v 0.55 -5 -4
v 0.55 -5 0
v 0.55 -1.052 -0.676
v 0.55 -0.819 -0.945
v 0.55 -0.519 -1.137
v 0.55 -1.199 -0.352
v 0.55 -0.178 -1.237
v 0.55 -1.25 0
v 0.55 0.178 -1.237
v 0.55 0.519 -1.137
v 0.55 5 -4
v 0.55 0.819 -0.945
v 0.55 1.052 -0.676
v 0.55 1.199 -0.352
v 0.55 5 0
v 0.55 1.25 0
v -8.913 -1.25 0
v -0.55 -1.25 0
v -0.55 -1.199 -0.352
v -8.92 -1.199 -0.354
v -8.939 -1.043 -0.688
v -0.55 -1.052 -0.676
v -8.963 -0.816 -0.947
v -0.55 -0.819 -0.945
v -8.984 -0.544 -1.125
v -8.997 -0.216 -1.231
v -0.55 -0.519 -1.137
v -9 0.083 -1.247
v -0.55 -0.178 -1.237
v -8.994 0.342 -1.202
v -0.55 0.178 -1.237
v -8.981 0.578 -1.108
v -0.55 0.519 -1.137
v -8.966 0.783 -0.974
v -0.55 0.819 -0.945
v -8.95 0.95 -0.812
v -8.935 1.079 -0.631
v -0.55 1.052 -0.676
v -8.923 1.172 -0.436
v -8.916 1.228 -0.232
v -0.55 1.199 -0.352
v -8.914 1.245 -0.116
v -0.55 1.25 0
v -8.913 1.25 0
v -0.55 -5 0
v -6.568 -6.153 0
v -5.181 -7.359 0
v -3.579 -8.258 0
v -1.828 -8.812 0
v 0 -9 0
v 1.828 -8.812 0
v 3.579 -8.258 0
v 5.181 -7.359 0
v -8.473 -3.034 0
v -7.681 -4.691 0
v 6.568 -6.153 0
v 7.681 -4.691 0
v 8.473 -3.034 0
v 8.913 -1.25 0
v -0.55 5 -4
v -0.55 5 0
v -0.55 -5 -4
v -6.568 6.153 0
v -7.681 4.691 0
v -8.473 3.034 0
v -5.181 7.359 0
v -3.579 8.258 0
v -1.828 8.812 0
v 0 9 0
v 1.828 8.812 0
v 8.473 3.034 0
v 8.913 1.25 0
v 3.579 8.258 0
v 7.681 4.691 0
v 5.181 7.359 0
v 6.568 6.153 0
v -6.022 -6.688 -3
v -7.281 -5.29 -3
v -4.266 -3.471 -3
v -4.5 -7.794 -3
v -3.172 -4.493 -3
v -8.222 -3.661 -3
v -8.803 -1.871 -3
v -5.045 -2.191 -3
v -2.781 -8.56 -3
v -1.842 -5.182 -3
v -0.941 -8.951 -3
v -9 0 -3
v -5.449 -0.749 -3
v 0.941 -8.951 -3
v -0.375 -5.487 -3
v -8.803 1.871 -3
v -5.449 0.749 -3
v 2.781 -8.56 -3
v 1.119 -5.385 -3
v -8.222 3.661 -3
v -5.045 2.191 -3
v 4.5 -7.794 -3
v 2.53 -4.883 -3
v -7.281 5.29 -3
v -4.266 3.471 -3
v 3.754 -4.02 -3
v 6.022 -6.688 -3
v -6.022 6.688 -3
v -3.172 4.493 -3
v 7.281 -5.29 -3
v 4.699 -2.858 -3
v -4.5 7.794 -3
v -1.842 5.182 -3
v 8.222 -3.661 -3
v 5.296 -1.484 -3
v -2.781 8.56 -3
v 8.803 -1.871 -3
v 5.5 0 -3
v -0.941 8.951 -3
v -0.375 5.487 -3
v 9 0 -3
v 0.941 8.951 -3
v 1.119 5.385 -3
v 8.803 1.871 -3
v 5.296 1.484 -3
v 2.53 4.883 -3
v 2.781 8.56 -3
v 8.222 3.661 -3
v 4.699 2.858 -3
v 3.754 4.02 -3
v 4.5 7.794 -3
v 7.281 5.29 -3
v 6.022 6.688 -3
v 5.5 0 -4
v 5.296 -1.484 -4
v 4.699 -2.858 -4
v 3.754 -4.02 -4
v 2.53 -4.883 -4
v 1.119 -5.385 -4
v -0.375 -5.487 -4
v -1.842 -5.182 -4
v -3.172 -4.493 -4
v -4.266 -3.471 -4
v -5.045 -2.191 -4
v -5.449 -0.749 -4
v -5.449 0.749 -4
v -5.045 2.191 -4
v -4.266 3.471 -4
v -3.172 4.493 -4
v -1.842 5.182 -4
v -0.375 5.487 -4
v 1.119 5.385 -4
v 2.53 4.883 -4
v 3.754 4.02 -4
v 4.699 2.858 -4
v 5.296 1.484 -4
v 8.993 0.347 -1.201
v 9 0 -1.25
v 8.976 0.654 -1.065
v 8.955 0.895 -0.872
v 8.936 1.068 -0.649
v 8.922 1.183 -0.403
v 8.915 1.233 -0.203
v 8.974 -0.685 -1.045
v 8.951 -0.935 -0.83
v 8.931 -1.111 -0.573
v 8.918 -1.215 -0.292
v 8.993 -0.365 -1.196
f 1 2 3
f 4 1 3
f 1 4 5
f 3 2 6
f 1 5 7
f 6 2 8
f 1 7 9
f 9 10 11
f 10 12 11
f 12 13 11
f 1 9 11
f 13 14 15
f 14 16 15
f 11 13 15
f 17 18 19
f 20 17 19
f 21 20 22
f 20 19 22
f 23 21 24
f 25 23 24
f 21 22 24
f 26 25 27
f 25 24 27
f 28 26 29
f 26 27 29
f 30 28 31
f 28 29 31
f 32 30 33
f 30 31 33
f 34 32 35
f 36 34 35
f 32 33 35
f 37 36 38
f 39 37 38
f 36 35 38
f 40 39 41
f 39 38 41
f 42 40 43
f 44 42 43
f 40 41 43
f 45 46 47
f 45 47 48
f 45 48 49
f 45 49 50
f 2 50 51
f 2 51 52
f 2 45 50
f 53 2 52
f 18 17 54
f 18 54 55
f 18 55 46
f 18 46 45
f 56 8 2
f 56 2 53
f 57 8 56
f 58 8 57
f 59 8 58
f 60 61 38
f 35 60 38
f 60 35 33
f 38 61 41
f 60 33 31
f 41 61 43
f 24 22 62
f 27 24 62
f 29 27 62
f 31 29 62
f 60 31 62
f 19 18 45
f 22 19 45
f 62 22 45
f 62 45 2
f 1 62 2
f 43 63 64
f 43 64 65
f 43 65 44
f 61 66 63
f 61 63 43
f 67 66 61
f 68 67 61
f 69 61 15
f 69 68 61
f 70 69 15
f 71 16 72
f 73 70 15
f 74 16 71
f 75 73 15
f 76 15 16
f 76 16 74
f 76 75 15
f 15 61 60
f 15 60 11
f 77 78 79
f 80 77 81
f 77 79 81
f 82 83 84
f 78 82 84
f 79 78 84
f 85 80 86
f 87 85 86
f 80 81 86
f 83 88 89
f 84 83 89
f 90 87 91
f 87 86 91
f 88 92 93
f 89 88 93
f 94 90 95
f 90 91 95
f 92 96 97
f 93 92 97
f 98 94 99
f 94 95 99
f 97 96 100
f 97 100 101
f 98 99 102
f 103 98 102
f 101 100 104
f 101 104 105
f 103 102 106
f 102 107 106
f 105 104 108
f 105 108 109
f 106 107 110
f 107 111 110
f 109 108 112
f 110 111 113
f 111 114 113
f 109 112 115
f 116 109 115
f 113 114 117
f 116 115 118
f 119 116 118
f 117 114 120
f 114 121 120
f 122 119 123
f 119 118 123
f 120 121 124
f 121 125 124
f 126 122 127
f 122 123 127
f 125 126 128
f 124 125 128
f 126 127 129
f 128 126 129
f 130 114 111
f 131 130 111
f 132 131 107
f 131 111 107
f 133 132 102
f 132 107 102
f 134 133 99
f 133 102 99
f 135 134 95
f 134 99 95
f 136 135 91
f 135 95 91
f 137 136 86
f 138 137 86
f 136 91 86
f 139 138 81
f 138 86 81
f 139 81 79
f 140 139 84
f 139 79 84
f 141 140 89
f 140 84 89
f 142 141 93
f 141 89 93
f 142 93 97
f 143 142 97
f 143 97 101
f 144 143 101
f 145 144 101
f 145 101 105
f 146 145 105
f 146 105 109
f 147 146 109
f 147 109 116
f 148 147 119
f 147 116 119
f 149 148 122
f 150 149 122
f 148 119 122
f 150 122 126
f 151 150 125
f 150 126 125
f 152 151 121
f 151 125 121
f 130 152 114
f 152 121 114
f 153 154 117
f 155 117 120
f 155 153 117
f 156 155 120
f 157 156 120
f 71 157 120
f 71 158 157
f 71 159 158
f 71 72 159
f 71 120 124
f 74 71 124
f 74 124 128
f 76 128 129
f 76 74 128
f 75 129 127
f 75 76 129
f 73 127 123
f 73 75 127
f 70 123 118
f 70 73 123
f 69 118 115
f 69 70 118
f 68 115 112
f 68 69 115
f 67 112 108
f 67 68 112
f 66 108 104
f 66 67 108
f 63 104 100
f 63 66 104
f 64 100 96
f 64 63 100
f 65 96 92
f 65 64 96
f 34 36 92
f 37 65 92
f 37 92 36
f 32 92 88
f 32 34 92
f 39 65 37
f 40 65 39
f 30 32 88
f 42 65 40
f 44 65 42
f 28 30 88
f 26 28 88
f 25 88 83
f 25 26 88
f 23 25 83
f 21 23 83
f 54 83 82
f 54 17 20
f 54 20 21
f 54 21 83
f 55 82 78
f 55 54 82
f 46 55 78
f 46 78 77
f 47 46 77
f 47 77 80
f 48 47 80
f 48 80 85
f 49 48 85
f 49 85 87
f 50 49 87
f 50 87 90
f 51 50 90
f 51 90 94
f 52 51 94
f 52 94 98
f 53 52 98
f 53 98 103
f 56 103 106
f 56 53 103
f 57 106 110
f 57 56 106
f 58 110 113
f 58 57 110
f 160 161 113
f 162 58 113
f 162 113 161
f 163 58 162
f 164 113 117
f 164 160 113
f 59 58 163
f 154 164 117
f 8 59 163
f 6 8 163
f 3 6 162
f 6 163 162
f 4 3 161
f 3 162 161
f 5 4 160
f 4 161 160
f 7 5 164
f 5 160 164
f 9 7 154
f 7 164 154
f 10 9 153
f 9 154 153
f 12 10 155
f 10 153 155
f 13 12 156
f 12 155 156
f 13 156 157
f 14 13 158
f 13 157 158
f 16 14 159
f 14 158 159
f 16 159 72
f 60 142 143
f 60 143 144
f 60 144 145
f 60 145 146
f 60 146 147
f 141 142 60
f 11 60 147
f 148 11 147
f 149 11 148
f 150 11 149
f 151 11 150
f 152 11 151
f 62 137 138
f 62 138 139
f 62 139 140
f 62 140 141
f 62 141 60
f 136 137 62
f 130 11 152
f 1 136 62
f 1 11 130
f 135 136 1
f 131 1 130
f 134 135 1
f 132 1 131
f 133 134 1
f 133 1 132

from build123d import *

# Parameters (mm, degrees)
F0_R     = 9
F1_DEPTH = 3
F2_R     = 5.5
F3_DEPTH = 1
F4_R     = 1.25
F5_DEPTH = 9
F6_W     = 1.1
F6_H     = 3.75
F6_H_2   = 2.5
F7_DEPTH = 4.001


# Not quite as in the source:
# - a feature names something its author has since deleted; it is built from what else it names


with BuildPart() as f1:
    # F0 (on Top) → F1 (new body)
    with BuildSketch(Plane.XY):
        Circle(F0_R)
    extrude(amount=-F1_DEPTH)

    # F2 (on face) → F3 (join)
    with BuildSketch(Plane(origin=(0, 0, -3), x_dir=(1, 0, 0), z_dir=(0, 0, -1))):
        Circle(F2_R)
    extrude(amount=F3_DEPTH)

    # F4 (on Right) → F5 (cut, symmetric)
    with BuildSketch(Plane.YZ):
        Circle(F4_R)
    extrude(amount=F5_DEPTH, both=True, mode=Mode.SUBTRACT)

    # F6 (on face) → F7 (cut, through all)
    with BuildSketch(Plane.XY):
        with Locations((0, -3.125)):
            Rectangle(F6_W, F6_H)
        Rectangle(F6_W, F6_H_2)
        with Locations((0, 3.125)):
            Rectangle(F6_W, F6_H)
    extrude(amount=-F7_DEPTH, mode=Mode.SUBTRACT)


solid = f1.part
